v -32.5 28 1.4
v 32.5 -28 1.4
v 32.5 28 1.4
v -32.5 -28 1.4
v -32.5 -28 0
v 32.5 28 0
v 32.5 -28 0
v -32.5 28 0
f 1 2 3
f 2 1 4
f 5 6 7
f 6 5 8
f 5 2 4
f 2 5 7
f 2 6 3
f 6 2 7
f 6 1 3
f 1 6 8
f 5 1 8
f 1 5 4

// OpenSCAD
$fn = 64;

board_x = 65.0;
board_y = 56.0;
board_th = 1.4;

color([0.05, 0.45, 0.15])
translate([-board_x/2, -board_y/2, 0])
cube([board_x, board_y, board_th], center=false);
